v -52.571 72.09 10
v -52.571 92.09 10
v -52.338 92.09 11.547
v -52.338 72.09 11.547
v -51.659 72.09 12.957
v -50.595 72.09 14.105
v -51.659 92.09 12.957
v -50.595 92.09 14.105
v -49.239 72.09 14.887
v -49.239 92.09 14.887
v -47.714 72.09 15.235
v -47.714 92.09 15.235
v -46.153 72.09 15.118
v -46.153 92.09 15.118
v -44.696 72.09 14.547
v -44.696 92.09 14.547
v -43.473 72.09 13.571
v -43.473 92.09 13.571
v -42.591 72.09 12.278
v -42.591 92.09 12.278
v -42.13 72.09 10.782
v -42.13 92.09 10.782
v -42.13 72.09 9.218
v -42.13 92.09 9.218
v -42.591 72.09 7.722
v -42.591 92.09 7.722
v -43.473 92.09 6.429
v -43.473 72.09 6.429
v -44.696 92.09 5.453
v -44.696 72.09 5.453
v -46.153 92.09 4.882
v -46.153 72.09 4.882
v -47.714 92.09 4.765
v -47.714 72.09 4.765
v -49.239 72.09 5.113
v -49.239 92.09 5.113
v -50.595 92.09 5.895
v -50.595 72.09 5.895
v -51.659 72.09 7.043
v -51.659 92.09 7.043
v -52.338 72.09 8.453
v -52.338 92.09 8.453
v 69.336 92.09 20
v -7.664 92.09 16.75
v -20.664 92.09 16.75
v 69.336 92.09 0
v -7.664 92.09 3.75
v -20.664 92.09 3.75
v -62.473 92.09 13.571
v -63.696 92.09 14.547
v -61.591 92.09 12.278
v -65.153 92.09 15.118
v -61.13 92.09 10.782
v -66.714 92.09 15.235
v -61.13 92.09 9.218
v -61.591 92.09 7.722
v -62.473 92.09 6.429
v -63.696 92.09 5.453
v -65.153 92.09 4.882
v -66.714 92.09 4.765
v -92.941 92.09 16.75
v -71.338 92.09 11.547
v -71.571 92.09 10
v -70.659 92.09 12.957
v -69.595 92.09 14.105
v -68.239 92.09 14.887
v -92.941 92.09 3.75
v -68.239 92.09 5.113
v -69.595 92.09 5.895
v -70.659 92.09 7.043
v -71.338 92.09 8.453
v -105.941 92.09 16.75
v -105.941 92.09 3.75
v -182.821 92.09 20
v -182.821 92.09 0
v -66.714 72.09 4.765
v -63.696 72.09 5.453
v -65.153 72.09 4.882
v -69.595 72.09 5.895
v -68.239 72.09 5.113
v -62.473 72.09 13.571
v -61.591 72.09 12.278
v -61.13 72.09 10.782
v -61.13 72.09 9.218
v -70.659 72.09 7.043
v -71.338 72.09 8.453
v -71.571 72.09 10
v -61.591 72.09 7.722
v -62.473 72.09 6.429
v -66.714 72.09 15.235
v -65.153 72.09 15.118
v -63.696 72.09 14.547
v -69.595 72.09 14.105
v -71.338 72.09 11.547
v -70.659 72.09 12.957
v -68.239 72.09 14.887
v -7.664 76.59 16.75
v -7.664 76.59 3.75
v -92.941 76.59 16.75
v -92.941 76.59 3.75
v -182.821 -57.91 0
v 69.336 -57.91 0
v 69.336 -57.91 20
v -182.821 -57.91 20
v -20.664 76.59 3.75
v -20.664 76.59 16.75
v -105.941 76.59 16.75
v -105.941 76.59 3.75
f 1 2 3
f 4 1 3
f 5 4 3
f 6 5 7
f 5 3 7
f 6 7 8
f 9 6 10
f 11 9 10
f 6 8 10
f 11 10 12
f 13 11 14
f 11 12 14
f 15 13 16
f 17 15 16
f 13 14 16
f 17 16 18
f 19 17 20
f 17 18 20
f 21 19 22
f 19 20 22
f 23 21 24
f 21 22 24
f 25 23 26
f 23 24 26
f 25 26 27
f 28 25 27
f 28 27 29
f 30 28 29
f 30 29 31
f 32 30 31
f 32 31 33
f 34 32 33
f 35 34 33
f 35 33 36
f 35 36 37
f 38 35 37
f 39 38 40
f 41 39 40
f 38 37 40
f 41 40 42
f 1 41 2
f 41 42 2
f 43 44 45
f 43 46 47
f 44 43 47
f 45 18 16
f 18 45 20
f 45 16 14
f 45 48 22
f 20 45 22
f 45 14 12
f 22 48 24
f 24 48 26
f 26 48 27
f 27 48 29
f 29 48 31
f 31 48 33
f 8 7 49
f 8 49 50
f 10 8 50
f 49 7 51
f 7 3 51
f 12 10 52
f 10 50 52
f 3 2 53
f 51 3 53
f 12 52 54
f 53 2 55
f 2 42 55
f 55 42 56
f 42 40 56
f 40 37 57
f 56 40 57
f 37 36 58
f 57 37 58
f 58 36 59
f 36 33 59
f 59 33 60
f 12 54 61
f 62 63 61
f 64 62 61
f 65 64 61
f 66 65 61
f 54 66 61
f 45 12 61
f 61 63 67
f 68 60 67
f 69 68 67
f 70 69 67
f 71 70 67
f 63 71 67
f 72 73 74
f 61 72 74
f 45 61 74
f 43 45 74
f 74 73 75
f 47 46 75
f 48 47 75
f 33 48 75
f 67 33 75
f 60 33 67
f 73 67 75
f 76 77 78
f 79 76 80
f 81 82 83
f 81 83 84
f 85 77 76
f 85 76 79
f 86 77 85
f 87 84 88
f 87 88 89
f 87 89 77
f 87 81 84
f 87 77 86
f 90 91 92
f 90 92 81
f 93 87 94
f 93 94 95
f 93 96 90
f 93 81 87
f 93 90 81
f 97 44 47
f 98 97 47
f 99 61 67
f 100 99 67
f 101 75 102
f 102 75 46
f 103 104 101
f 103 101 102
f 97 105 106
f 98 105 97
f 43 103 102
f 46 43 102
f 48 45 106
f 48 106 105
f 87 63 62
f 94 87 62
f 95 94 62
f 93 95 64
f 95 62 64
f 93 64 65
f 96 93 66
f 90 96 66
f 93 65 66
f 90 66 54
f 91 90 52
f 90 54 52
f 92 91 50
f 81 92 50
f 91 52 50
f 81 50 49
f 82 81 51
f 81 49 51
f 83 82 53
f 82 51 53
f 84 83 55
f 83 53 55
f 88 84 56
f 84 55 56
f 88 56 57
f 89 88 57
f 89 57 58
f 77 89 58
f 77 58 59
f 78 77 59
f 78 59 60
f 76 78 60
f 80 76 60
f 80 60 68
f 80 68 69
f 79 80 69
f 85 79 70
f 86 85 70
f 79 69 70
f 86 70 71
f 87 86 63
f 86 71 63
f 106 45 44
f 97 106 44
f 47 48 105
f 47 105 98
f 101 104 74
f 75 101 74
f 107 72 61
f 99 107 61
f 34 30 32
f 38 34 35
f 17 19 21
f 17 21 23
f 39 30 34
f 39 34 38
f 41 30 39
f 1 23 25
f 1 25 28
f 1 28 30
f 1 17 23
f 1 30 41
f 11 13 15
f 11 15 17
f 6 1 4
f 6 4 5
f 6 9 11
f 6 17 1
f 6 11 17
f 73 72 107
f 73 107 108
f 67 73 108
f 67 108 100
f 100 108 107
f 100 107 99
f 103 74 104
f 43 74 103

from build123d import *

# Parameters (mm, degrees)
BOSS_EXTRUDE1_DEPTH = 20
SKETCH5_R           = 5.25
CUT_EXTRUDE4_DEPTH  = 20
SKETCH6_W           = 13
SKETCH6_H           = 13
CUT_EXTRUDE5_DEPTH  = 15.5
SKETCH7_W           = 13
SKETCH7_H           = 13
CUT_EXTRUDE6_DEPTH  = 15.5
SKETCH8_W           = 300
SKETCH8_H           = 102
BOSS_EXTRUDE2_DEPTH = 20
CUT_EXTRUDE7_START  = -150
SKETCH9_W           = 47.842391085
SKETCH9_H           = 20
CUT_EXTRUDE7_DEPTH  = 150


with BuildPart() as part:
    # Sketch1 → Boss-Extrude1 (new body)
    with BuildSketch(Plane.XY):
        Polygon((-107.821386225, 92.09039548), (-7.821386225, 92.09039548), (117.178613775, 92.09039548), (117.178613775, 44.09039548), (-7.821386225, 44.09039548), (-107.821386225, 44.09039548), (-182.821386225, 44.09039548), (-182.821386225, 92.09039548), align=None)
    extrude(amount=BOSS_EXTRUDE1_DEPTH)

    # Sketch5 → Cut-Extrude4 (cut)
    with BuildSketch(Plane(origin=(0, 92.09039548, 0), x_dir=(1, 0, 0), z_dir=(0, 1, 0))):
        with Locations(Location((-66.321386225, -10, 0), (0, 0, 180))):
            Circle(SKETCH5_R)
        with Locations(Location((-47.321386225, -10, 0), (0, 0, 180))):
            Circle(SKETCH5_R)
    extrude(amount=-CUT_EXTRUDE4_DEPTH, mode=Mode.SUBTRACT)

    # Sketch6 → Cut-Extrude5 (cut)
    with BuildSketch(Plane(origin=(0, 92.09039548, 0), x_dir=(1, 0, 0), z_dir=(0, 1, 0))):
        with Locations((-99.441386225, -10.25)):
            Rectangle(SKETCH6_W, SKETCH6_H)
    extrude(amount=-CUT_EXTRUDE5_DEPTH, mode=Mode.SUBTRACT)

    # Sketch7 → Cut-Extrude6 (cut)
    with BuildSketch(Plane(origin=(0, 92.09039548, 0), x_dir=(1, 0, 0), z_dir=(0, 1, 0))):
        with Locations((-14.16377731, -10.25)):
            Rectangle(SKETCH7_W, SKETCH7_H)
    extrude(amount=-CUT_EXTRUDE6_DEPTH, mode=Mode.SUBTRACT)

    # Sketch8 → Boss-Extrude2 (add)
    with BuildSketch(Plane.XY.offset(20)):
        with Locations((-32.821386225, -6.90960452)):
            Rectangle(SKETCH8_W, SKETCH8_H)
    extrude(amount=-BOSS_EXTRUDE2_DEPTH)

    # Sketch9 → Cut-Extrude7 (cut)
    with BuildSketch(Plane(origin=(0, 92.09039548, 0), x_dir=(1, 0, 0), z_dir=(0, 1, 0)).offset(CUT_EXTRUDE7_START)):
        with Locations((93.257418233, -10)):
            Rectangle(SKETCH9_W, SKETCH9_H)
    extrude(amount=CUT_EXTRUDE7_DEPTH, mode=Mode.SUBTRACT)


solid = part.part
